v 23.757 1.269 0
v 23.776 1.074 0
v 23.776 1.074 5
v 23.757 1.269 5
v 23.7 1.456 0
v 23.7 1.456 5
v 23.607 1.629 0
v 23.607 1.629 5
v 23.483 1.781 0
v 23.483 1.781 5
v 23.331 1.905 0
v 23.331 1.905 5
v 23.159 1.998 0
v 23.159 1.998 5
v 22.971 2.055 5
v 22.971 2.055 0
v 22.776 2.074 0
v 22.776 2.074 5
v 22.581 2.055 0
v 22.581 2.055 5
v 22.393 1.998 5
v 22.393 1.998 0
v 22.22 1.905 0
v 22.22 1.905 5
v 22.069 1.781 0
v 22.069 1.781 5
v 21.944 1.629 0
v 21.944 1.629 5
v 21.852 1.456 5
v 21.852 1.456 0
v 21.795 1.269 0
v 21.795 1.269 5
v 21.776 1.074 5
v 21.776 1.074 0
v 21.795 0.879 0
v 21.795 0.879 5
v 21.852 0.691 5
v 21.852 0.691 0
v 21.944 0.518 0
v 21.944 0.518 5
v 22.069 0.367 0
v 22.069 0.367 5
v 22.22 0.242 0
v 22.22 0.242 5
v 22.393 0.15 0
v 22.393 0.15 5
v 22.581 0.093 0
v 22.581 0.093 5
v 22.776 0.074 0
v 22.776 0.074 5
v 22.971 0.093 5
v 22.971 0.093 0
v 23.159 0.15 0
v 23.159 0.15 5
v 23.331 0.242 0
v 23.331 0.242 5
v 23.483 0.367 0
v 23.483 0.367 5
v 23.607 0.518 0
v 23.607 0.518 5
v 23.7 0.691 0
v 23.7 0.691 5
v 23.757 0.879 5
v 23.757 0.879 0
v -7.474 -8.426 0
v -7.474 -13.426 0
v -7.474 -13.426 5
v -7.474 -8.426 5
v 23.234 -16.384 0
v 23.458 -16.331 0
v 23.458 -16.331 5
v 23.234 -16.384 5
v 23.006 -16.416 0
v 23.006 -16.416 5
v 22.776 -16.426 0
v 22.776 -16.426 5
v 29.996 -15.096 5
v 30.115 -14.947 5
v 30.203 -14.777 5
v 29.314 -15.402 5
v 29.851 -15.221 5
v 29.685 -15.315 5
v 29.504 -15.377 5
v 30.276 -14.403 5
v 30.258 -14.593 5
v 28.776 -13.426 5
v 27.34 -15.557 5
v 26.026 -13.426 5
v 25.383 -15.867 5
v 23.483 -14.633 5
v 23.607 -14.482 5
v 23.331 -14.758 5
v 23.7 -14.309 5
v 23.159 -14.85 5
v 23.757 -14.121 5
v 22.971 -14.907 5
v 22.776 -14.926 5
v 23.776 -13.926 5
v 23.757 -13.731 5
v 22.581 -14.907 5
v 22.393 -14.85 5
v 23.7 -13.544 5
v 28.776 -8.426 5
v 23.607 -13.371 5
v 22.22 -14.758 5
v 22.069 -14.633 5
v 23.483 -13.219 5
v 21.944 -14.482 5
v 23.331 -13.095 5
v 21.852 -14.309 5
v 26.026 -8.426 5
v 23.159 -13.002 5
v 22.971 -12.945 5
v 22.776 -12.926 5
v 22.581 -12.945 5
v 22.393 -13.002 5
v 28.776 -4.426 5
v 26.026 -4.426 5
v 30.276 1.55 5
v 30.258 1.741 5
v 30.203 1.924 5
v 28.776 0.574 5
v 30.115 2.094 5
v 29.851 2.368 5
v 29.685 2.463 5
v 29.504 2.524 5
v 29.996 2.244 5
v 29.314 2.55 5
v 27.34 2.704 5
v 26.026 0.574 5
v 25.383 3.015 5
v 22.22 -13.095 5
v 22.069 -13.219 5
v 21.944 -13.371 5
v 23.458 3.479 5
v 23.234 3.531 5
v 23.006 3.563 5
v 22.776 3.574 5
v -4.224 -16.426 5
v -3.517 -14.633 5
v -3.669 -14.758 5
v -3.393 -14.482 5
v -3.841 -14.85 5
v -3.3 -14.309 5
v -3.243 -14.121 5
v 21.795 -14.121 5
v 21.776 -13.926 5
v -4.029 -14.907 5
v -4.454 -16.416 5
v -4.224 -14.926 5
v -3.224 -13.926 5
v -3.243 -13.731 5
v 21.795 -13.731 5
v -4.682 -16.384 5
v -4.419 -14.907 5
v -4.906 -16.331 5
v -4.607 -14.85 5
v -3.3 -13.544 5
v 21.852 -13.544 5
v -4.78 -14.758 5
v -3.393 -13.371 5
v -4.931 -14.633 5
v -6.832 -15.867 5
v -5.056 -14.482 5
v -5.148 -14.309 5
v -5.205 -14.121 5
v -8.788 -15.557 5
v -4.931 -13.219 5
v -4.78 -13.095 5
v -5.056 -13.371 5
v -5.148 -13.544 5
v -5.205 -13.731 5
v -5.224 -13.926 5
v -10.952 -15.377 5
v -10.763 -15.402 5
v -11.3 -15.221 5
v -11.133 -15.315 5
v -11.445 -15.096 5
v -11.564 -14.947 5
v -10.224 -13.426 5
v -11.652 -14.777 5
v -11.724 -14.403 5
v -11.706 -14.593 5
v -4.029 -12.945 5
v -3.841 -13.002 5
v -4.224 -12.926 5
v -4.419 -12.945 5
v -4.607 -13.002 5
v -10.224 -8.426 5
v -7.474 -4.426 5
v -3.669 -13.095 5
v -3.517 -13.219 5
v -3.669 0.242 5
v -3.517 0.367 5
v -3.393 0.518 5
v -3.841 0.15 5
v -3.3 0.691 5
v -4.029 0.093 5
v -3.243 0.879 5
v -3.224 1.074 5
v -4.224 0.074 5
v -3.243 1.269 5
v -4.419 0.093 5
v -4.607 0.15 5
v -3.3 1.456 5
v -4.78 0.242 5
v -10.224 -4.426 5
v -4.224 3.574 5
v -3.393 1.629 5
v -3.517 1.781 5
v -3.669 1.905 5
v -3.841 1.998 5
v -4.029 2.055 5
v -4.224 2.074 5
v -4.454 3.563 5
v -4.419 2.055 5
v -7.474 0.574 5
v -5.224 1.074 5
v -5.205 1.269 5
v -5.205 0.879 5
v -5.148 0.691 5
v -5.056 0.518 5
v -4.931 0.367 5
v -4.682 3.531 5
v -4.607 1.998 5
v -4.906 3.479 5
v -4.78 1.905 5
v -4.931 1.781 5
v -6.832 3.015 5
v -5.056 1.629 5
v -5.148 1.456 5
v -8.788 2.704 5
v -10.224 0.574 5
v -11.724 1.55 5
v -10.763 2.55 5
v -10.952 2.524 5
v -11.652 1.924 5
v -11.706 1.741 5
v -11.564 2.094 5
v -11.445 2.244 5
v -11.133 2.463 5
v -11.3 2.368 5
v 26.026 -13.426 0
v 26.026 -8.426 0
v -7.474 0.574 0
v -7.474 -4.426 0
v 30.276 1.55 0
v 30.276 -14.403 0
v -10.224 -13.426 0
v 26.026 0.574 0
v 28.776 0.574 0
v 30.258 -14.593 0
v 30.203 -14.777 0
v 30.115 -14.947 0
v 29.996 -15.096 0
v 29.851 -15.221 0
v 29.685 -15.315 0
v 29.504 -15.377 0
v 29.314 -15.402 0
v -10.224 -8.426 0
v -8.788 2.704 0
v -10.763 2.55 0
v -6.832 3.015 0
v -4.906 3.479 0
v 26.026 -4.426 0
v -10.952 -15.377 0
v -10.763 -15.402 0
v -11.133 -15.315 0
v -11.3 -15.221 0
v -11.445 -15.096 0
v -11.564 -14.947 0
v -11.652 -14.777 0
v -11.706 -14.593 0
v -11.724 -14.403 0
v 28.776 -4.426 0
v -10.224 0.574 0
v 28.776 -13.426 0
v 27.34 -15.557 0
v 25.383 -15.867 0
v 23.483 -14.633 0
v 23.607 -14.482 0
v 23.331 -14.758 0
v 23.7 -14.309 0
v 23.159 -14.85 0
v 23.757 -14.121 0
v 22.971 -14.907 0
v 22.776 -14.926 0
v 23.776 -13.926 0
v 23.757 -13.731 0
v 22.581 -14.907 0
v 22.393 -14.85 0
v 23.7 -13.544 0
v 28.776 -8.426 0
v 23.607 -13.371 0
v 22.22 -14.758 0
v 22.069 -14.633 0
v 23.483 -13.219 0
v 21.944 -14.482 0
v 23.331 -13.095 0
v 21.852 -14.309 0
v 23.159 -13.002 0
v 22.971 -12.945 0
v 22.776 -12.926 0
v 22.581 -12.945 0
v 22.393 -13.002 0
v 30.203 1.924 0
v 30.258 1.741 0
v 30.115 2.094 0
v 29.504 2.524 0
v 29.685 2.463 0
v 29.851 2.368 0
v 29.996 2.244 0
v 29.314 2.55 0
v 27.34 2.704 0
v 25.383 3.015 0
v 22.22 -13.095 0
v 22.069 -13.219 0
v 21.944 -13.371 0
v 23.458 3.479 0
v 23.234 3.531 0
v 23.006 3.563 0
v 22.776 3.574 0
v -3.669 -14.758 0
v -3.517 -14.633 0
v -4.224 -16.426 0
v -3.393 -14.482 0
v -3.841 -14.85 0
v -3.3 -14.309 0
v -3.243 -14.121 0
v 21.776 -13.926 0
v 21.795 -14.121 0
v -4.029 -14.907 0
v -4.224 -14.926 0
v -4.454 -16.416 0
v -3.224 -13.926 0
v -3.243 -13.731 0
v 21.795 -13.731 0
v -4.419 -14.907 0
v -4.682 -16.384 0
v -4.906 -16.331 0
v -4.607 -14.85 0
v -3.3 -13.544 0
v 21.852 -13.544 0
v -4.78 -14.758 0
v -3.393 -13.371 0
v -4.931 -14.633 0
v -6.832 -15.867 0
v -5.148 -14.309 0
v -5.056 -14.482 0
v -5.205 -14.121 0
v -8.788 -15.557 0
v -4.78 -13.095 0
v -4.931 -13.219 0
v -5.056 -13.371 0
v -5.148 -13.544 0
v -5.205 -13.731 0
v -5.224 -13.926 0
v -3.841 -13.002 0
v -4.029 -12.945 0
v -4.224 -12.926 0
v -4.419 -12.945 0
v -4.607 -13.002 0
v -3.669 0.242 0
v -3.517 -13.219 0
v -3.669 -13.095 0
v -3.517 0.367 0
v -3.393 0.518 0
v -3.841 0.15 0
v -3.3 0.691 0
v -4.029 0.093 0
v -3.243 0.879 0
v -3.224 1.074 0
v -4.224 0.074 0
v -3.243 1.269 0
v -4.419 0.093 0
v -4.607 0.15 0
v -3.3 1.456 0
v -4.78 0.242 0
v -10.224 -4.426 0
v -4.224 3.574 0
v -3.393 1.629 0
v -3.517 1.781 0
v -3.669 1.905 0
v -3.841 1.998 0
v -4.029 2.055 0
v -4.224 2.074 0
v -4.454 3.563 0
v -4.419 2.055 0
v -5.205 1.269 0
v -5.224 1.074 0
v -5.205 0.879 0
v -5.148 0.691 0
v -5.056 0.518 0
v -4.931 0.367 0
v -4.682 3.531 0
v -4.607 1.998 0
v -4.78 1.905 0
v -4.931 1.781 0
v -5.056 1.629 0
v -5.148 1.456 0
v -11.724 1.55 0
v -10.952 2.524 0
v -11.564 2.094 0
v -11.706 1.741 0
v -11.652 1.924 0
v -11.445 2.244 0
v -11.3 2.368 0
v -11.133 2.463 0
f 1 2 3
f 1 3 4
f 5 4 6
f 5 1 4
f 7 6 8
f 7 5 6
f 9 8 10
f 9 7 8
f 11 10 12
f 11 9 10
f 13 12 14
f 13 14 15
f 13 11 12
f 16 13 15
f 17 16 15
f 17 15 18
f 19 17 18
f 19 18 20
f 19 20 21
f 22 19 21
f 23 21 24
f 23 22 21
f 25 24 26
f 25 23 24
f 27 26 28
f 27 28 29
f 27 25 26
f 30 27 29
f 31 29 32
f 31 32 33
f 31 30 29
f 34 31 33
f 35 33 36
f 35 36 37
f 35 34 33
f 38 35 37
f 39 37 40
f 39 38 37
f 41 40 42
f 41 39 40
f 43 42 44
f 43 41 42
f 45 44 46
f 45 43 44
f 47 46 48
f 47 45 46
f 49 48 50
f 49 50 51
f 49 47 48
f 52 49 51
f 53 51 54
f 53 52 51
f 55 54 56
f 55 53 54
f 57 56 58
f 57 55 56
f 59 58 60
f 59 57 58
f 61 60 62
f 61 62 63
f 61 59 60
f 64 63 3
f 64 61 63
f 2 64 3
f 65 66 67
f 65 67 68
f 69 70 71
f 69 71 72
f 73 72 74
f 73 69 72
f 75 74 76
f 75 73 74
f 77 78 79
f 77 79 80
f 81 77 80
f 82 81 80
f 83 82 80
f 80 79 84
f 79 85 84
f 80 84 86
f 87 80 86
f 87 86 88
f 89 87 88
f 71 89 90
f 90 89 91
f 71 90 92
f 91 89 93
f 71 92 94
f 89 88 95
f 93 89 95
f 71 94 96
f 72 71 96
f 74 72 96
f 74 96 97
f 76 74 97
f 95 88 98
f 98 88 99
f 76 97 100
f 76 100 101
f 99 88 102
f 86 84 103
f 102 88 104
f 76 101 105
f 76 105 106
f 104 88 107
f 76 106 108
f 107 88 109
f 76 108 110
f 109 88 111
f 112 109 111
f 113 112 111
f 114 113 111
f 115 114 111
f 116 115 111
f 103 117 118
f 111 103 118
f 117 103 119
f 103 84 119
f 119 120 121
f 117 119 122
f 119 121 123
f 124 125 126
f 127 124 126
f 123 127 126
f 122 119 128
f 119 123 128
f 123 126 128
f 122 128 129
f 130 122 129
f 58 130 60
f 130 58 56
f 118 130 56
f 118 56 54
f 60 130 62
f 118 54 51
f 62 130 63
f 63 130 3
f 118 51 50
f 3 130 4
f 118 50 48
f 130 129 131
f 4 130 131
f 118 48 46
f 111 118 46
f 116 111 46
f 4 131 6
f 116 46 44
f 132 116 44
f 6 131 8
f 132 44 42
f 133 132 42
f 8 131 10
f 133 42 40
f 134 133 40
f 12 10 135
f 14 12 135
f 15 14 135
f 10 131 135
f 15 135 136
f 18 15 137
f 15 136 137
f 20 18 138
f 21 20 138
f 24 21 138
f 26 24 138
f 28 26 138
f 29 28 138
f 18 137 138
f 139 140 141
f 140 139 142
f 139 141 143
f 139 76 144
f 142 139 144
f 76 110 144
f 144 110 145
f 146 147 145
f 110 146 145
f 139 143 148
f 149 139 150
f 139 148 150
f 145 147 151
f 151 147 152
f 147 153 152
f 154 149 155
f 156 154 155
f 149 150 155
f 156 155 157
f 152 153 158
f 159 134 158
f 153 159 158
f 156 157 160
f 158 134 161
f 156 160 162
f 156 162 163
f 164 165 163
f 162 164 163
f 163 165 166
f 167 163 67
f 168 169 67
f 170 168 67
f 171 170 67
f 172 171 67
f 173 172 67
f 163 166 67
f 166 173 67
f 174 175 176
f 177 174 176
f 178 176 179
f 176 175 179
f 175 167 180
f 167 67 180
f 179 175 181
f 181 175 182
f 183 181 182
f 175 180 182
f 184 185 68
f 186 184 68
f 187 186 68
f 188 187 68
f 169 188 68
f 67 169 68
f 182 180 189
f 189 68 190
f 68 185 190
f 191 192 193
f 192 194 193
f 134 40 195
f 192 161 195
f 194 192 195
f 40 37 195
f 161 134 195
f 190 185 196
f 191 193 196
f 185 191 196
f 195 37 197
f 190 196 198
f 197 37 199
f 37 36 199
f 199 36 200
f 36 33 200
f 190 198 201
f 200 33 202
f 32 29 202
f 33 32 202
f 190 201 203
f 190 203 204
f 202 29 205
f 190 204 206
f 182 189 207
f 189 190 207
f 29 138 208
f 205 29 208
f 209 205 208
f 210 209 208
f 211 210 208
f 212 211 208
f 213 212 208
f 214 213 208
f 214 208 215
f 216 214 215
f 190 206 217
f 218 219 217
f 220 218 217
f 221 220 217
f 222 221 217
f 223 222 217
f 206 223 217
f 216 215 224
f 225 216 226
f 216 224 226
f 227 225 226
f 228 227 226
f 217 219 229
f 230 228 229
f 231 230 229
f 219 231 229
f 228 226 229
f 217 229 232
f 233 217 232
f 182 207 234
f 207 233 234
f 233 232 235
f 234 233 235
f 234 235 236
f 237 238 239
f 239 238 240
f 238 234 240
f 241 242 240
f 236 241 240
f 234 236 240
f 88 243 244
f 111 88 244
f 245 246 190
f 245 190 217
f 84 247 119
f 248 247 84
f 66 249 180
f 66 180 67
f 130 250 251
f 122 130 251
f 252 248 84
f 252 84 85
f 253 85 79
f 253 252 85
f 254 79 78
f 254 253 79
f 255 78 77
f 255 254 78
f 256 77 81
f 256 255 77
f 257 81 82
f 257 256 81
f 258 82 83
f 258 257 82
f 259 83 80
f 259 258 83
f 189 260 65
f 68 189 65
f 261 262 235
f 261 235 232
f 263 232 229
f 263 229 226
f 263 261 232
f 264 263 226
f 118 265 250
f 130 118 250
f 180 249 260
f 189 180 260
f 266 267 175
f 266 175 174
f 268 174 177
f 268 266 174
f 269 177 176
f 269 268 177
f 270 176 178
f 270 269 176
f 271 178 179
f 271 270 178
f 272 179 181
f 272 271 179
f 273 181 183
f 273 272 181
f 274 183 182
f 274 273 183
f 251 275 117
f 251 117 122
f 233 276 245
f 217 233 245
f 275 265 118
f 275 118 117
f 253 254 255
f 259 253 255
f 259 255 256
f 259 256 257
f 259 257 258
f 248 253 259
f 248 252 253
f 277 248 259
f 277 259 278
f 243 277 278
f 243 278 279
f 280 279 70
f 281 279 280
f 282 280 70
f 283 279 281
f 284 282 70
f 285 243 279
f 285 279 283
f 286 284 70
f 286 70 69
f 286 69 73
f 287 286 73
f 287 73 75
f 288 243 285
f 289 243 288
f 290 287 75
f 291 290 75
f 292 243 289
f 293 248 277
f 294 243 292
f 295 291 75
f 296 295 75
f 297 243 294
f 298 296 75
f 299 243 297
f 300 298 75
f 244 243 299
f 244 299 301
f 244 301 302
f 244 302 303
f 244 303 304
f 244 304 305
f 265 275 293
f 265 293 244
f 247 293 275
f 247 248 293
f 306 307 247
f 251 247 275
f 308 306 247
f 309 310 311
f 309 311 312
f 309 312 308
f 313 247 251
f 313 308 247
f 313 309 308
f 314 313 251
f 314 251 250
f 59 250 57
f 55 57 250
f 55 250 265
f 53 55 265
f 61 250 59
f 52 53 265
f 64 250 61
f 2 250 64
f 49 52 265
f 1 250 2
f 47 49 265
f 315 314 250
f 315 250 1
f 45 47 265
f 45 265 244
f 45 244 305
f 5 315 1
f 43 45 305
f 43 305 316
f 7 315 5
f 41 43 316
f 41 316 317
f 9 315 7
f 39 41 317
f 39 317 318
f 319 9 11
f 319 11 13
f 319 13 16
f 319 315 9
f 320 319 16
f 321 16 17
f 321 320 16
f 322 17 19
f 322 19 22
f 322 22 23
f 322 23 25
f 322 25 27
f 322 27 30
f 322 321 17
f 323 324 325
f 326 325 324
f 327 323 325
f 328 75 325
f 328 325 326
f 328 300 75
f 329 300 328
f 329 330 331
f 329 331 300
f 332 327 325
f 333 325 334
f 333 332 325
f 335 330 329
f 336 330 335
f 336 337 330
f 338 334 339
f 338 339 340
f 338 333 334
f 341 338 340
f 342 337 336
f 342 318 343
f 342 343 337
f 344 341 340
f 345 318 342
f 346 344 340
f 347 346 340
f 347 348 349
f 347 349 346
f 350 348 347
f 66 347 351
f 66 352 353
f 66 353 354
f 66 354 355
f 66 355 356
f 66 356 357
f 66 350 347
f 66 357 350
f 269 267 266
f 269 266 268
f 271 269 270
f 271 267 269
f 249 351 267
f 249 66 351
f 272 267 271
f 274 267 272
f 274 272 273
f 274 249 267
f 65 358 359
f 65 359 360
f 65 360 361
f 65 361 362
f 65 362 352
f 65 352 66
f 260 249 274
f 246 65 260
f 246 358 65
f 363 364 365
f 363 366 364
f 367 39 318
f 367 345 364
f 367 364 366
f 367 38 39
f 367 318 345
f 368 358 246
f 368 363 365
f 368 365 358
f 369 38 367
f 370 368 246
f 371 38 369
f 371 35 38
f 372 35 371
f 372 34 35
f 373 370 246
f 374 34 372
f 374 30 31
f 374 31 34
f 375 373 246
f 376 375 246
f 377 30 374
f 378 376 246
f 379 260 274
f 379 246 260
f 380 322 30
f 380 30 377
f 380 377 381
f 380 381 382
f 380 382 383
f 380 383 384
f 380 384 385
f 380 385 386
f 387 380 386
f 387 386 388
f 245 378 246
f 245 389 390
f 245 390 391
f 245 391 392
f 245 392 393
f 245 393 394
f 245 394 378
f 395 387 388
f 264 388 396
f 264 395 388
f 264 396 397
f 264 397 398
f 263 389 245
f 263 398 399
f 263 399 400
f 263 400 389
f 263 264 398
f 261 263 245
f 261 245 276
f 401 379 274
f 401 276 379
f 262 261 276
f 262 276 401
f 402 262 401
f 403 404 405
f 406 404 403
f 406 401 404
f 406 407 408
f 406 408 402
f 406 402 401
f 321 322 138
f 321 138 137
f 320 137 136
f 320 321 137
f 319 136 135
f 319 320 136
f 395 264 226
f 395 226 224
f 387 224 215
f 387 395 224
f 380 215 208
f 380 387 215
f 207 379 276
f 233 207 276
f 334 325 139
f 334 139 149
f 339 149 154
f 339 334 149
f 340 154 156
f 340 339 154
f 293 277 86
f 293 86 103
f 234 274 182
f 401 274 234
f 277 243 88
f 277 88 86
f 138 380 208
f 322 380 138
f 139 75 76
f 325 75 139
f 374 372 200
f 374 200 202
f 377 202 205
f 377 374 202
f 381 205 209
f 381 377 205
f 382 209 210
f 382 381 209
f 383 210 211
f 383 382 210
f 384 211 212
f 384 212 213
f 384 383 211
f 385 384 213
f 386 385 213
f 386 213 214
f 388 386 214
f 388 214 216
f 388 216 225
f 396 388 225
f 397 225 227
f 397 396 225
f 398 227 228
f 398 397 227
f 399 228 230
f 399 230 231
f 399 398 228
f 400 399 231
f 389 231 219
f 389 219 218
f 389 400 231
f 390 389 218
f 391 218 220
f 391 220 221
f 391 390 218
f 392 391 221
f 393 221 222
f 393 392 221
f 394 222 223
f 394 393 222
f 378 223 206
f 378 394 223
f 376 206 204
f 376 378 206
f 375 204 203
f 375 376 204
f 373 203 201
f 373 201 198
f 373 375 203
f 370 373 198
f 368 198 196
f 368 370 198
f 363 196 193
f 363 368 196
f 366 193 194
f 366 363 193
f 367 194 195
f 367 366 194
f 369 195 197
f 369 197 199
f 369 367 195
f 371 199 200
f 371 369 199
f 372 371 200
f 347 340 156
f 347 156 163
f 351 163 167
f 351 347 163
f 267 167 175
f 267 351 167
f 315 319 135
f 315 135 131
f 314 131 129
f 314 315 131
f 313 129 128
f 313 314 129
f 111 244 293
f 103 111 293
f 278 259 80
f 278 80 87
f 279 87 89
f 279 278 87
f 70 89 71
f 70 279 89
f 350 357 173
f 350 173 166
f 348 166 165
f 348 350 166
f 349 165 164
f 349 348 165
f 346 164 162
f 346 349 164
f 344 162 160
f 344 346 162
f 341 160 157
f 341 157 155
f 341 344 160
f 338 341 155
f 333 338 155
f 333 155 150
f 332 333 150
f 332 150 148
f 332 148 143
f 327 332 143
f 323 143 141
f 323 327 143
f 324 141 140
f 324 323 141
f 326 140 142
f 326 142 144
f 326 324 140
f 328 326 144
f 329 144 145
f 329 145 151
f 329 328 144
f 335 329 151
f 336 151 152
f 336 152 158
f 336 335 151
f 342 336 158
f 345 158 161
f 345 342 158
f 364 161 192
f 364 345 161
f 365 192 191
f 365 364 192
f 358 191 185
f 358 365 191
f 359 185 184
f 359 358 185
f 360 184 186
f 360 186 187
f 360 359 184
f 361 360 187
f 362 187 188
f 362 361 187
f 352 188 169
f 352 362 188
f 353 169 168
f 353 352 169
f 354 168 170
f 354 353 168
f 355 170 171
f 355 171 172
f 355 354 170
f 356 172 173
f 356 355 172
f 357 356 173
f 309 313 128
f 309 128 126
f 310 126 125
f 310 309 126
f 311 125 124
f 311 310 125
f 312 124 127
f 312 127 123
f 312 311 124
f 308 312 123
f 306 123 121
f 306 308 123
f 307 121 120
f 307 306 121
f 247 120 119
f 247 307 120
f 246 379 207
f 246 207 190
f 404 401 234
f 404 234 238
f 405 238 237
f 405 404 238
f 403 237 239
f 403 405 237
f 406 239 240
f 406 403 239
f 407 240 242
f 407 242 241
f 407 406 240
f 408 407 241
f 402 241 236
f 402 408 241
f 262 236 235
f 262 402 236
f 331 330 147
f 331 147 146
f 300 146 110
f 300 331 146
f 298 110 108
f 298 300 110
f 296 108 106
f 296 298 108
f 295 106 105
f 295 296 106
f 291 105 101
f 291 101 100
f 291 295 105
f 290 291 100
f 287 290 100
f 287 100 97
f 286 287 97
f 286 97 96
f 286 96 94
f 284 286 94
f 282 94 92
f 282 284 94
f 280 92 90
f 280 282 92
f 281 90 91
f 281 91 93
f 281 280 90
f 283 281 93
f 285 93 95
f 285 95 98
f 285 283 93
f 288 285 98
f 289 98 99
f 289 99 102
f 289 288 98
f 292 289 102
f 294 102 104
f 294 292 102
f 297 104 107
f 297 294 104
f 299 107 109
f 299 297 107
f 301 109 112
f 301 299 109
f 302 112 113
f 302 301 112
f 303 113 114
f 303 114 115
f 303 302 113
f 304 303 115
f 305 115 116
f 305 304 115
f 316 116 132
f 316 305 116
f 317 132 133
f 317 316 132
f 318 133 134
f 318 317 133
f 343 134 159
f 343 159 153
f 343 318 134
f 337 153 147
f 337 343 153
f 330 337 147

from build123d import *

# Parameters (mm, degrees)
ESQUISSE1_R        = 1
ESQUISSE1_W        = 2.75
ESQUISSE1_H        = 5
BOSS_EXTRU_1_DEPTH = 5


with BuildPart() as part:
    # Esquisse1 → Boss.-Extru.1 (new body)
    with BuildSketch(Plane.XY):
        with BuildLine():
            Line((22.775862069, -16.426262466), (-4.224137931, -16.426262466))
            ThreePointArc((-4.224137931, -16.426262466), (-4.568324536, -16.402456235), (-4.905956113, -16.331490931))
            ThreePointArc((-4.905956113, -16.331490931), (-7.806629393, -15.692620747), (-10.762599469, -15.402273545))
            ThreePointArc((-10.762599469, -15.402273545), (-11.444714623, -15.096388709), (-11.724137931, -14.403013463))
            Line((-11.724137931, -14.403013463), (-11.724137931, 1.550488531))
            ThreePointArc((-11.724137931, 1.550488531), (-11.444714623, 2.243863776), (-10.762599469, 2.549748612))
            ThreePointArc((-10.762599469, 2.549748612), (-7.806629393, 2.840095814), (-4.905956113, 3.478965998))
            ThreePointArc((-4.905956113, 3.478965998), (-4.568324536, 3.549931303), (-4.224137931, 3.573737534))
            Line((-4.224137931, 3.573737534), (22.775862069, 3.573737534))
            ThreePointArc((22.775862069, 3.573737534), (23.120048674, 3.549931303), (23.457680251, 3.478965998))
            ThreePointArc((23.457680251, 3.478965998), (26.358353531, 2.840095814), (29.314323607, 2.549748612))
            ThreePointArc((29.314323607, 2.549748612), (29.996438761, 2.243863776), (30.275862069, 1.550488531))
            Line((30.275862069, 1.550488531), (30.275862069, -14.403013463))
            ThreePointArc((30.275862069, -14.403013463), (29.996438761, -15.096388709), (29.314323607, -15.402273545))
            ThreePointArc((29.314323607, -15.402273545), (26.358353531, -15.692620747), (23.457680251, -16.331490931))
            ThreePointArc((23.457680251, -16.331490931), (23.120048674, -16.402456235), (22.775862069, -16.426262466))
        make_face()
        with Locations((-4.224137931, 1.073737534)):
            Circle(ESQUISSE1_R, mode=Mode.SUBTRACT)
        with Locations((22.775862069, 1.073737534)):
            Circle(ESQUISSE1_R, mode=Mode.SUBTRACT)
        with Locations(Location((22.775862069, -13.926262466, 0), (0, 0, 180))):
            Circle(ESQUISSE1_R, mode=Mode.SUBTRACT)
        with Locations(Location((-4.224137931, -13.926262466, 0), (0, 0, 180))):
            Circle(ESQUISSE1_R, mode=Mode.SUBTRACT)
        with Locations((27.400862069, -10.926262466)):
            Rectangle(ESQUISSE1_W, ESQUISSE1_H, mode=Mode.SUBTRACT)
        with Locations((-8.849137931, -1.926262466)):
            Rectangle(ESQUISSE1_W, ESQUISSE1_H, mode=Mode.SUBTRACT)
        with Locations((-8.849137931, -10.926262466)):
            Rectangle(ESQUISSE1_W, ESQUISSE1_H, mode=Mode.SUBTRACT)
        with Locations((27.400862069, -1.926262466)):
            Rectangle(ESQUISSE1_W, ESQUISSE1_H, mode=Mode.SUBTRACT)
    extrude(amount=BOSS_EXTRU_1_DEPTH)


solid = part.part
